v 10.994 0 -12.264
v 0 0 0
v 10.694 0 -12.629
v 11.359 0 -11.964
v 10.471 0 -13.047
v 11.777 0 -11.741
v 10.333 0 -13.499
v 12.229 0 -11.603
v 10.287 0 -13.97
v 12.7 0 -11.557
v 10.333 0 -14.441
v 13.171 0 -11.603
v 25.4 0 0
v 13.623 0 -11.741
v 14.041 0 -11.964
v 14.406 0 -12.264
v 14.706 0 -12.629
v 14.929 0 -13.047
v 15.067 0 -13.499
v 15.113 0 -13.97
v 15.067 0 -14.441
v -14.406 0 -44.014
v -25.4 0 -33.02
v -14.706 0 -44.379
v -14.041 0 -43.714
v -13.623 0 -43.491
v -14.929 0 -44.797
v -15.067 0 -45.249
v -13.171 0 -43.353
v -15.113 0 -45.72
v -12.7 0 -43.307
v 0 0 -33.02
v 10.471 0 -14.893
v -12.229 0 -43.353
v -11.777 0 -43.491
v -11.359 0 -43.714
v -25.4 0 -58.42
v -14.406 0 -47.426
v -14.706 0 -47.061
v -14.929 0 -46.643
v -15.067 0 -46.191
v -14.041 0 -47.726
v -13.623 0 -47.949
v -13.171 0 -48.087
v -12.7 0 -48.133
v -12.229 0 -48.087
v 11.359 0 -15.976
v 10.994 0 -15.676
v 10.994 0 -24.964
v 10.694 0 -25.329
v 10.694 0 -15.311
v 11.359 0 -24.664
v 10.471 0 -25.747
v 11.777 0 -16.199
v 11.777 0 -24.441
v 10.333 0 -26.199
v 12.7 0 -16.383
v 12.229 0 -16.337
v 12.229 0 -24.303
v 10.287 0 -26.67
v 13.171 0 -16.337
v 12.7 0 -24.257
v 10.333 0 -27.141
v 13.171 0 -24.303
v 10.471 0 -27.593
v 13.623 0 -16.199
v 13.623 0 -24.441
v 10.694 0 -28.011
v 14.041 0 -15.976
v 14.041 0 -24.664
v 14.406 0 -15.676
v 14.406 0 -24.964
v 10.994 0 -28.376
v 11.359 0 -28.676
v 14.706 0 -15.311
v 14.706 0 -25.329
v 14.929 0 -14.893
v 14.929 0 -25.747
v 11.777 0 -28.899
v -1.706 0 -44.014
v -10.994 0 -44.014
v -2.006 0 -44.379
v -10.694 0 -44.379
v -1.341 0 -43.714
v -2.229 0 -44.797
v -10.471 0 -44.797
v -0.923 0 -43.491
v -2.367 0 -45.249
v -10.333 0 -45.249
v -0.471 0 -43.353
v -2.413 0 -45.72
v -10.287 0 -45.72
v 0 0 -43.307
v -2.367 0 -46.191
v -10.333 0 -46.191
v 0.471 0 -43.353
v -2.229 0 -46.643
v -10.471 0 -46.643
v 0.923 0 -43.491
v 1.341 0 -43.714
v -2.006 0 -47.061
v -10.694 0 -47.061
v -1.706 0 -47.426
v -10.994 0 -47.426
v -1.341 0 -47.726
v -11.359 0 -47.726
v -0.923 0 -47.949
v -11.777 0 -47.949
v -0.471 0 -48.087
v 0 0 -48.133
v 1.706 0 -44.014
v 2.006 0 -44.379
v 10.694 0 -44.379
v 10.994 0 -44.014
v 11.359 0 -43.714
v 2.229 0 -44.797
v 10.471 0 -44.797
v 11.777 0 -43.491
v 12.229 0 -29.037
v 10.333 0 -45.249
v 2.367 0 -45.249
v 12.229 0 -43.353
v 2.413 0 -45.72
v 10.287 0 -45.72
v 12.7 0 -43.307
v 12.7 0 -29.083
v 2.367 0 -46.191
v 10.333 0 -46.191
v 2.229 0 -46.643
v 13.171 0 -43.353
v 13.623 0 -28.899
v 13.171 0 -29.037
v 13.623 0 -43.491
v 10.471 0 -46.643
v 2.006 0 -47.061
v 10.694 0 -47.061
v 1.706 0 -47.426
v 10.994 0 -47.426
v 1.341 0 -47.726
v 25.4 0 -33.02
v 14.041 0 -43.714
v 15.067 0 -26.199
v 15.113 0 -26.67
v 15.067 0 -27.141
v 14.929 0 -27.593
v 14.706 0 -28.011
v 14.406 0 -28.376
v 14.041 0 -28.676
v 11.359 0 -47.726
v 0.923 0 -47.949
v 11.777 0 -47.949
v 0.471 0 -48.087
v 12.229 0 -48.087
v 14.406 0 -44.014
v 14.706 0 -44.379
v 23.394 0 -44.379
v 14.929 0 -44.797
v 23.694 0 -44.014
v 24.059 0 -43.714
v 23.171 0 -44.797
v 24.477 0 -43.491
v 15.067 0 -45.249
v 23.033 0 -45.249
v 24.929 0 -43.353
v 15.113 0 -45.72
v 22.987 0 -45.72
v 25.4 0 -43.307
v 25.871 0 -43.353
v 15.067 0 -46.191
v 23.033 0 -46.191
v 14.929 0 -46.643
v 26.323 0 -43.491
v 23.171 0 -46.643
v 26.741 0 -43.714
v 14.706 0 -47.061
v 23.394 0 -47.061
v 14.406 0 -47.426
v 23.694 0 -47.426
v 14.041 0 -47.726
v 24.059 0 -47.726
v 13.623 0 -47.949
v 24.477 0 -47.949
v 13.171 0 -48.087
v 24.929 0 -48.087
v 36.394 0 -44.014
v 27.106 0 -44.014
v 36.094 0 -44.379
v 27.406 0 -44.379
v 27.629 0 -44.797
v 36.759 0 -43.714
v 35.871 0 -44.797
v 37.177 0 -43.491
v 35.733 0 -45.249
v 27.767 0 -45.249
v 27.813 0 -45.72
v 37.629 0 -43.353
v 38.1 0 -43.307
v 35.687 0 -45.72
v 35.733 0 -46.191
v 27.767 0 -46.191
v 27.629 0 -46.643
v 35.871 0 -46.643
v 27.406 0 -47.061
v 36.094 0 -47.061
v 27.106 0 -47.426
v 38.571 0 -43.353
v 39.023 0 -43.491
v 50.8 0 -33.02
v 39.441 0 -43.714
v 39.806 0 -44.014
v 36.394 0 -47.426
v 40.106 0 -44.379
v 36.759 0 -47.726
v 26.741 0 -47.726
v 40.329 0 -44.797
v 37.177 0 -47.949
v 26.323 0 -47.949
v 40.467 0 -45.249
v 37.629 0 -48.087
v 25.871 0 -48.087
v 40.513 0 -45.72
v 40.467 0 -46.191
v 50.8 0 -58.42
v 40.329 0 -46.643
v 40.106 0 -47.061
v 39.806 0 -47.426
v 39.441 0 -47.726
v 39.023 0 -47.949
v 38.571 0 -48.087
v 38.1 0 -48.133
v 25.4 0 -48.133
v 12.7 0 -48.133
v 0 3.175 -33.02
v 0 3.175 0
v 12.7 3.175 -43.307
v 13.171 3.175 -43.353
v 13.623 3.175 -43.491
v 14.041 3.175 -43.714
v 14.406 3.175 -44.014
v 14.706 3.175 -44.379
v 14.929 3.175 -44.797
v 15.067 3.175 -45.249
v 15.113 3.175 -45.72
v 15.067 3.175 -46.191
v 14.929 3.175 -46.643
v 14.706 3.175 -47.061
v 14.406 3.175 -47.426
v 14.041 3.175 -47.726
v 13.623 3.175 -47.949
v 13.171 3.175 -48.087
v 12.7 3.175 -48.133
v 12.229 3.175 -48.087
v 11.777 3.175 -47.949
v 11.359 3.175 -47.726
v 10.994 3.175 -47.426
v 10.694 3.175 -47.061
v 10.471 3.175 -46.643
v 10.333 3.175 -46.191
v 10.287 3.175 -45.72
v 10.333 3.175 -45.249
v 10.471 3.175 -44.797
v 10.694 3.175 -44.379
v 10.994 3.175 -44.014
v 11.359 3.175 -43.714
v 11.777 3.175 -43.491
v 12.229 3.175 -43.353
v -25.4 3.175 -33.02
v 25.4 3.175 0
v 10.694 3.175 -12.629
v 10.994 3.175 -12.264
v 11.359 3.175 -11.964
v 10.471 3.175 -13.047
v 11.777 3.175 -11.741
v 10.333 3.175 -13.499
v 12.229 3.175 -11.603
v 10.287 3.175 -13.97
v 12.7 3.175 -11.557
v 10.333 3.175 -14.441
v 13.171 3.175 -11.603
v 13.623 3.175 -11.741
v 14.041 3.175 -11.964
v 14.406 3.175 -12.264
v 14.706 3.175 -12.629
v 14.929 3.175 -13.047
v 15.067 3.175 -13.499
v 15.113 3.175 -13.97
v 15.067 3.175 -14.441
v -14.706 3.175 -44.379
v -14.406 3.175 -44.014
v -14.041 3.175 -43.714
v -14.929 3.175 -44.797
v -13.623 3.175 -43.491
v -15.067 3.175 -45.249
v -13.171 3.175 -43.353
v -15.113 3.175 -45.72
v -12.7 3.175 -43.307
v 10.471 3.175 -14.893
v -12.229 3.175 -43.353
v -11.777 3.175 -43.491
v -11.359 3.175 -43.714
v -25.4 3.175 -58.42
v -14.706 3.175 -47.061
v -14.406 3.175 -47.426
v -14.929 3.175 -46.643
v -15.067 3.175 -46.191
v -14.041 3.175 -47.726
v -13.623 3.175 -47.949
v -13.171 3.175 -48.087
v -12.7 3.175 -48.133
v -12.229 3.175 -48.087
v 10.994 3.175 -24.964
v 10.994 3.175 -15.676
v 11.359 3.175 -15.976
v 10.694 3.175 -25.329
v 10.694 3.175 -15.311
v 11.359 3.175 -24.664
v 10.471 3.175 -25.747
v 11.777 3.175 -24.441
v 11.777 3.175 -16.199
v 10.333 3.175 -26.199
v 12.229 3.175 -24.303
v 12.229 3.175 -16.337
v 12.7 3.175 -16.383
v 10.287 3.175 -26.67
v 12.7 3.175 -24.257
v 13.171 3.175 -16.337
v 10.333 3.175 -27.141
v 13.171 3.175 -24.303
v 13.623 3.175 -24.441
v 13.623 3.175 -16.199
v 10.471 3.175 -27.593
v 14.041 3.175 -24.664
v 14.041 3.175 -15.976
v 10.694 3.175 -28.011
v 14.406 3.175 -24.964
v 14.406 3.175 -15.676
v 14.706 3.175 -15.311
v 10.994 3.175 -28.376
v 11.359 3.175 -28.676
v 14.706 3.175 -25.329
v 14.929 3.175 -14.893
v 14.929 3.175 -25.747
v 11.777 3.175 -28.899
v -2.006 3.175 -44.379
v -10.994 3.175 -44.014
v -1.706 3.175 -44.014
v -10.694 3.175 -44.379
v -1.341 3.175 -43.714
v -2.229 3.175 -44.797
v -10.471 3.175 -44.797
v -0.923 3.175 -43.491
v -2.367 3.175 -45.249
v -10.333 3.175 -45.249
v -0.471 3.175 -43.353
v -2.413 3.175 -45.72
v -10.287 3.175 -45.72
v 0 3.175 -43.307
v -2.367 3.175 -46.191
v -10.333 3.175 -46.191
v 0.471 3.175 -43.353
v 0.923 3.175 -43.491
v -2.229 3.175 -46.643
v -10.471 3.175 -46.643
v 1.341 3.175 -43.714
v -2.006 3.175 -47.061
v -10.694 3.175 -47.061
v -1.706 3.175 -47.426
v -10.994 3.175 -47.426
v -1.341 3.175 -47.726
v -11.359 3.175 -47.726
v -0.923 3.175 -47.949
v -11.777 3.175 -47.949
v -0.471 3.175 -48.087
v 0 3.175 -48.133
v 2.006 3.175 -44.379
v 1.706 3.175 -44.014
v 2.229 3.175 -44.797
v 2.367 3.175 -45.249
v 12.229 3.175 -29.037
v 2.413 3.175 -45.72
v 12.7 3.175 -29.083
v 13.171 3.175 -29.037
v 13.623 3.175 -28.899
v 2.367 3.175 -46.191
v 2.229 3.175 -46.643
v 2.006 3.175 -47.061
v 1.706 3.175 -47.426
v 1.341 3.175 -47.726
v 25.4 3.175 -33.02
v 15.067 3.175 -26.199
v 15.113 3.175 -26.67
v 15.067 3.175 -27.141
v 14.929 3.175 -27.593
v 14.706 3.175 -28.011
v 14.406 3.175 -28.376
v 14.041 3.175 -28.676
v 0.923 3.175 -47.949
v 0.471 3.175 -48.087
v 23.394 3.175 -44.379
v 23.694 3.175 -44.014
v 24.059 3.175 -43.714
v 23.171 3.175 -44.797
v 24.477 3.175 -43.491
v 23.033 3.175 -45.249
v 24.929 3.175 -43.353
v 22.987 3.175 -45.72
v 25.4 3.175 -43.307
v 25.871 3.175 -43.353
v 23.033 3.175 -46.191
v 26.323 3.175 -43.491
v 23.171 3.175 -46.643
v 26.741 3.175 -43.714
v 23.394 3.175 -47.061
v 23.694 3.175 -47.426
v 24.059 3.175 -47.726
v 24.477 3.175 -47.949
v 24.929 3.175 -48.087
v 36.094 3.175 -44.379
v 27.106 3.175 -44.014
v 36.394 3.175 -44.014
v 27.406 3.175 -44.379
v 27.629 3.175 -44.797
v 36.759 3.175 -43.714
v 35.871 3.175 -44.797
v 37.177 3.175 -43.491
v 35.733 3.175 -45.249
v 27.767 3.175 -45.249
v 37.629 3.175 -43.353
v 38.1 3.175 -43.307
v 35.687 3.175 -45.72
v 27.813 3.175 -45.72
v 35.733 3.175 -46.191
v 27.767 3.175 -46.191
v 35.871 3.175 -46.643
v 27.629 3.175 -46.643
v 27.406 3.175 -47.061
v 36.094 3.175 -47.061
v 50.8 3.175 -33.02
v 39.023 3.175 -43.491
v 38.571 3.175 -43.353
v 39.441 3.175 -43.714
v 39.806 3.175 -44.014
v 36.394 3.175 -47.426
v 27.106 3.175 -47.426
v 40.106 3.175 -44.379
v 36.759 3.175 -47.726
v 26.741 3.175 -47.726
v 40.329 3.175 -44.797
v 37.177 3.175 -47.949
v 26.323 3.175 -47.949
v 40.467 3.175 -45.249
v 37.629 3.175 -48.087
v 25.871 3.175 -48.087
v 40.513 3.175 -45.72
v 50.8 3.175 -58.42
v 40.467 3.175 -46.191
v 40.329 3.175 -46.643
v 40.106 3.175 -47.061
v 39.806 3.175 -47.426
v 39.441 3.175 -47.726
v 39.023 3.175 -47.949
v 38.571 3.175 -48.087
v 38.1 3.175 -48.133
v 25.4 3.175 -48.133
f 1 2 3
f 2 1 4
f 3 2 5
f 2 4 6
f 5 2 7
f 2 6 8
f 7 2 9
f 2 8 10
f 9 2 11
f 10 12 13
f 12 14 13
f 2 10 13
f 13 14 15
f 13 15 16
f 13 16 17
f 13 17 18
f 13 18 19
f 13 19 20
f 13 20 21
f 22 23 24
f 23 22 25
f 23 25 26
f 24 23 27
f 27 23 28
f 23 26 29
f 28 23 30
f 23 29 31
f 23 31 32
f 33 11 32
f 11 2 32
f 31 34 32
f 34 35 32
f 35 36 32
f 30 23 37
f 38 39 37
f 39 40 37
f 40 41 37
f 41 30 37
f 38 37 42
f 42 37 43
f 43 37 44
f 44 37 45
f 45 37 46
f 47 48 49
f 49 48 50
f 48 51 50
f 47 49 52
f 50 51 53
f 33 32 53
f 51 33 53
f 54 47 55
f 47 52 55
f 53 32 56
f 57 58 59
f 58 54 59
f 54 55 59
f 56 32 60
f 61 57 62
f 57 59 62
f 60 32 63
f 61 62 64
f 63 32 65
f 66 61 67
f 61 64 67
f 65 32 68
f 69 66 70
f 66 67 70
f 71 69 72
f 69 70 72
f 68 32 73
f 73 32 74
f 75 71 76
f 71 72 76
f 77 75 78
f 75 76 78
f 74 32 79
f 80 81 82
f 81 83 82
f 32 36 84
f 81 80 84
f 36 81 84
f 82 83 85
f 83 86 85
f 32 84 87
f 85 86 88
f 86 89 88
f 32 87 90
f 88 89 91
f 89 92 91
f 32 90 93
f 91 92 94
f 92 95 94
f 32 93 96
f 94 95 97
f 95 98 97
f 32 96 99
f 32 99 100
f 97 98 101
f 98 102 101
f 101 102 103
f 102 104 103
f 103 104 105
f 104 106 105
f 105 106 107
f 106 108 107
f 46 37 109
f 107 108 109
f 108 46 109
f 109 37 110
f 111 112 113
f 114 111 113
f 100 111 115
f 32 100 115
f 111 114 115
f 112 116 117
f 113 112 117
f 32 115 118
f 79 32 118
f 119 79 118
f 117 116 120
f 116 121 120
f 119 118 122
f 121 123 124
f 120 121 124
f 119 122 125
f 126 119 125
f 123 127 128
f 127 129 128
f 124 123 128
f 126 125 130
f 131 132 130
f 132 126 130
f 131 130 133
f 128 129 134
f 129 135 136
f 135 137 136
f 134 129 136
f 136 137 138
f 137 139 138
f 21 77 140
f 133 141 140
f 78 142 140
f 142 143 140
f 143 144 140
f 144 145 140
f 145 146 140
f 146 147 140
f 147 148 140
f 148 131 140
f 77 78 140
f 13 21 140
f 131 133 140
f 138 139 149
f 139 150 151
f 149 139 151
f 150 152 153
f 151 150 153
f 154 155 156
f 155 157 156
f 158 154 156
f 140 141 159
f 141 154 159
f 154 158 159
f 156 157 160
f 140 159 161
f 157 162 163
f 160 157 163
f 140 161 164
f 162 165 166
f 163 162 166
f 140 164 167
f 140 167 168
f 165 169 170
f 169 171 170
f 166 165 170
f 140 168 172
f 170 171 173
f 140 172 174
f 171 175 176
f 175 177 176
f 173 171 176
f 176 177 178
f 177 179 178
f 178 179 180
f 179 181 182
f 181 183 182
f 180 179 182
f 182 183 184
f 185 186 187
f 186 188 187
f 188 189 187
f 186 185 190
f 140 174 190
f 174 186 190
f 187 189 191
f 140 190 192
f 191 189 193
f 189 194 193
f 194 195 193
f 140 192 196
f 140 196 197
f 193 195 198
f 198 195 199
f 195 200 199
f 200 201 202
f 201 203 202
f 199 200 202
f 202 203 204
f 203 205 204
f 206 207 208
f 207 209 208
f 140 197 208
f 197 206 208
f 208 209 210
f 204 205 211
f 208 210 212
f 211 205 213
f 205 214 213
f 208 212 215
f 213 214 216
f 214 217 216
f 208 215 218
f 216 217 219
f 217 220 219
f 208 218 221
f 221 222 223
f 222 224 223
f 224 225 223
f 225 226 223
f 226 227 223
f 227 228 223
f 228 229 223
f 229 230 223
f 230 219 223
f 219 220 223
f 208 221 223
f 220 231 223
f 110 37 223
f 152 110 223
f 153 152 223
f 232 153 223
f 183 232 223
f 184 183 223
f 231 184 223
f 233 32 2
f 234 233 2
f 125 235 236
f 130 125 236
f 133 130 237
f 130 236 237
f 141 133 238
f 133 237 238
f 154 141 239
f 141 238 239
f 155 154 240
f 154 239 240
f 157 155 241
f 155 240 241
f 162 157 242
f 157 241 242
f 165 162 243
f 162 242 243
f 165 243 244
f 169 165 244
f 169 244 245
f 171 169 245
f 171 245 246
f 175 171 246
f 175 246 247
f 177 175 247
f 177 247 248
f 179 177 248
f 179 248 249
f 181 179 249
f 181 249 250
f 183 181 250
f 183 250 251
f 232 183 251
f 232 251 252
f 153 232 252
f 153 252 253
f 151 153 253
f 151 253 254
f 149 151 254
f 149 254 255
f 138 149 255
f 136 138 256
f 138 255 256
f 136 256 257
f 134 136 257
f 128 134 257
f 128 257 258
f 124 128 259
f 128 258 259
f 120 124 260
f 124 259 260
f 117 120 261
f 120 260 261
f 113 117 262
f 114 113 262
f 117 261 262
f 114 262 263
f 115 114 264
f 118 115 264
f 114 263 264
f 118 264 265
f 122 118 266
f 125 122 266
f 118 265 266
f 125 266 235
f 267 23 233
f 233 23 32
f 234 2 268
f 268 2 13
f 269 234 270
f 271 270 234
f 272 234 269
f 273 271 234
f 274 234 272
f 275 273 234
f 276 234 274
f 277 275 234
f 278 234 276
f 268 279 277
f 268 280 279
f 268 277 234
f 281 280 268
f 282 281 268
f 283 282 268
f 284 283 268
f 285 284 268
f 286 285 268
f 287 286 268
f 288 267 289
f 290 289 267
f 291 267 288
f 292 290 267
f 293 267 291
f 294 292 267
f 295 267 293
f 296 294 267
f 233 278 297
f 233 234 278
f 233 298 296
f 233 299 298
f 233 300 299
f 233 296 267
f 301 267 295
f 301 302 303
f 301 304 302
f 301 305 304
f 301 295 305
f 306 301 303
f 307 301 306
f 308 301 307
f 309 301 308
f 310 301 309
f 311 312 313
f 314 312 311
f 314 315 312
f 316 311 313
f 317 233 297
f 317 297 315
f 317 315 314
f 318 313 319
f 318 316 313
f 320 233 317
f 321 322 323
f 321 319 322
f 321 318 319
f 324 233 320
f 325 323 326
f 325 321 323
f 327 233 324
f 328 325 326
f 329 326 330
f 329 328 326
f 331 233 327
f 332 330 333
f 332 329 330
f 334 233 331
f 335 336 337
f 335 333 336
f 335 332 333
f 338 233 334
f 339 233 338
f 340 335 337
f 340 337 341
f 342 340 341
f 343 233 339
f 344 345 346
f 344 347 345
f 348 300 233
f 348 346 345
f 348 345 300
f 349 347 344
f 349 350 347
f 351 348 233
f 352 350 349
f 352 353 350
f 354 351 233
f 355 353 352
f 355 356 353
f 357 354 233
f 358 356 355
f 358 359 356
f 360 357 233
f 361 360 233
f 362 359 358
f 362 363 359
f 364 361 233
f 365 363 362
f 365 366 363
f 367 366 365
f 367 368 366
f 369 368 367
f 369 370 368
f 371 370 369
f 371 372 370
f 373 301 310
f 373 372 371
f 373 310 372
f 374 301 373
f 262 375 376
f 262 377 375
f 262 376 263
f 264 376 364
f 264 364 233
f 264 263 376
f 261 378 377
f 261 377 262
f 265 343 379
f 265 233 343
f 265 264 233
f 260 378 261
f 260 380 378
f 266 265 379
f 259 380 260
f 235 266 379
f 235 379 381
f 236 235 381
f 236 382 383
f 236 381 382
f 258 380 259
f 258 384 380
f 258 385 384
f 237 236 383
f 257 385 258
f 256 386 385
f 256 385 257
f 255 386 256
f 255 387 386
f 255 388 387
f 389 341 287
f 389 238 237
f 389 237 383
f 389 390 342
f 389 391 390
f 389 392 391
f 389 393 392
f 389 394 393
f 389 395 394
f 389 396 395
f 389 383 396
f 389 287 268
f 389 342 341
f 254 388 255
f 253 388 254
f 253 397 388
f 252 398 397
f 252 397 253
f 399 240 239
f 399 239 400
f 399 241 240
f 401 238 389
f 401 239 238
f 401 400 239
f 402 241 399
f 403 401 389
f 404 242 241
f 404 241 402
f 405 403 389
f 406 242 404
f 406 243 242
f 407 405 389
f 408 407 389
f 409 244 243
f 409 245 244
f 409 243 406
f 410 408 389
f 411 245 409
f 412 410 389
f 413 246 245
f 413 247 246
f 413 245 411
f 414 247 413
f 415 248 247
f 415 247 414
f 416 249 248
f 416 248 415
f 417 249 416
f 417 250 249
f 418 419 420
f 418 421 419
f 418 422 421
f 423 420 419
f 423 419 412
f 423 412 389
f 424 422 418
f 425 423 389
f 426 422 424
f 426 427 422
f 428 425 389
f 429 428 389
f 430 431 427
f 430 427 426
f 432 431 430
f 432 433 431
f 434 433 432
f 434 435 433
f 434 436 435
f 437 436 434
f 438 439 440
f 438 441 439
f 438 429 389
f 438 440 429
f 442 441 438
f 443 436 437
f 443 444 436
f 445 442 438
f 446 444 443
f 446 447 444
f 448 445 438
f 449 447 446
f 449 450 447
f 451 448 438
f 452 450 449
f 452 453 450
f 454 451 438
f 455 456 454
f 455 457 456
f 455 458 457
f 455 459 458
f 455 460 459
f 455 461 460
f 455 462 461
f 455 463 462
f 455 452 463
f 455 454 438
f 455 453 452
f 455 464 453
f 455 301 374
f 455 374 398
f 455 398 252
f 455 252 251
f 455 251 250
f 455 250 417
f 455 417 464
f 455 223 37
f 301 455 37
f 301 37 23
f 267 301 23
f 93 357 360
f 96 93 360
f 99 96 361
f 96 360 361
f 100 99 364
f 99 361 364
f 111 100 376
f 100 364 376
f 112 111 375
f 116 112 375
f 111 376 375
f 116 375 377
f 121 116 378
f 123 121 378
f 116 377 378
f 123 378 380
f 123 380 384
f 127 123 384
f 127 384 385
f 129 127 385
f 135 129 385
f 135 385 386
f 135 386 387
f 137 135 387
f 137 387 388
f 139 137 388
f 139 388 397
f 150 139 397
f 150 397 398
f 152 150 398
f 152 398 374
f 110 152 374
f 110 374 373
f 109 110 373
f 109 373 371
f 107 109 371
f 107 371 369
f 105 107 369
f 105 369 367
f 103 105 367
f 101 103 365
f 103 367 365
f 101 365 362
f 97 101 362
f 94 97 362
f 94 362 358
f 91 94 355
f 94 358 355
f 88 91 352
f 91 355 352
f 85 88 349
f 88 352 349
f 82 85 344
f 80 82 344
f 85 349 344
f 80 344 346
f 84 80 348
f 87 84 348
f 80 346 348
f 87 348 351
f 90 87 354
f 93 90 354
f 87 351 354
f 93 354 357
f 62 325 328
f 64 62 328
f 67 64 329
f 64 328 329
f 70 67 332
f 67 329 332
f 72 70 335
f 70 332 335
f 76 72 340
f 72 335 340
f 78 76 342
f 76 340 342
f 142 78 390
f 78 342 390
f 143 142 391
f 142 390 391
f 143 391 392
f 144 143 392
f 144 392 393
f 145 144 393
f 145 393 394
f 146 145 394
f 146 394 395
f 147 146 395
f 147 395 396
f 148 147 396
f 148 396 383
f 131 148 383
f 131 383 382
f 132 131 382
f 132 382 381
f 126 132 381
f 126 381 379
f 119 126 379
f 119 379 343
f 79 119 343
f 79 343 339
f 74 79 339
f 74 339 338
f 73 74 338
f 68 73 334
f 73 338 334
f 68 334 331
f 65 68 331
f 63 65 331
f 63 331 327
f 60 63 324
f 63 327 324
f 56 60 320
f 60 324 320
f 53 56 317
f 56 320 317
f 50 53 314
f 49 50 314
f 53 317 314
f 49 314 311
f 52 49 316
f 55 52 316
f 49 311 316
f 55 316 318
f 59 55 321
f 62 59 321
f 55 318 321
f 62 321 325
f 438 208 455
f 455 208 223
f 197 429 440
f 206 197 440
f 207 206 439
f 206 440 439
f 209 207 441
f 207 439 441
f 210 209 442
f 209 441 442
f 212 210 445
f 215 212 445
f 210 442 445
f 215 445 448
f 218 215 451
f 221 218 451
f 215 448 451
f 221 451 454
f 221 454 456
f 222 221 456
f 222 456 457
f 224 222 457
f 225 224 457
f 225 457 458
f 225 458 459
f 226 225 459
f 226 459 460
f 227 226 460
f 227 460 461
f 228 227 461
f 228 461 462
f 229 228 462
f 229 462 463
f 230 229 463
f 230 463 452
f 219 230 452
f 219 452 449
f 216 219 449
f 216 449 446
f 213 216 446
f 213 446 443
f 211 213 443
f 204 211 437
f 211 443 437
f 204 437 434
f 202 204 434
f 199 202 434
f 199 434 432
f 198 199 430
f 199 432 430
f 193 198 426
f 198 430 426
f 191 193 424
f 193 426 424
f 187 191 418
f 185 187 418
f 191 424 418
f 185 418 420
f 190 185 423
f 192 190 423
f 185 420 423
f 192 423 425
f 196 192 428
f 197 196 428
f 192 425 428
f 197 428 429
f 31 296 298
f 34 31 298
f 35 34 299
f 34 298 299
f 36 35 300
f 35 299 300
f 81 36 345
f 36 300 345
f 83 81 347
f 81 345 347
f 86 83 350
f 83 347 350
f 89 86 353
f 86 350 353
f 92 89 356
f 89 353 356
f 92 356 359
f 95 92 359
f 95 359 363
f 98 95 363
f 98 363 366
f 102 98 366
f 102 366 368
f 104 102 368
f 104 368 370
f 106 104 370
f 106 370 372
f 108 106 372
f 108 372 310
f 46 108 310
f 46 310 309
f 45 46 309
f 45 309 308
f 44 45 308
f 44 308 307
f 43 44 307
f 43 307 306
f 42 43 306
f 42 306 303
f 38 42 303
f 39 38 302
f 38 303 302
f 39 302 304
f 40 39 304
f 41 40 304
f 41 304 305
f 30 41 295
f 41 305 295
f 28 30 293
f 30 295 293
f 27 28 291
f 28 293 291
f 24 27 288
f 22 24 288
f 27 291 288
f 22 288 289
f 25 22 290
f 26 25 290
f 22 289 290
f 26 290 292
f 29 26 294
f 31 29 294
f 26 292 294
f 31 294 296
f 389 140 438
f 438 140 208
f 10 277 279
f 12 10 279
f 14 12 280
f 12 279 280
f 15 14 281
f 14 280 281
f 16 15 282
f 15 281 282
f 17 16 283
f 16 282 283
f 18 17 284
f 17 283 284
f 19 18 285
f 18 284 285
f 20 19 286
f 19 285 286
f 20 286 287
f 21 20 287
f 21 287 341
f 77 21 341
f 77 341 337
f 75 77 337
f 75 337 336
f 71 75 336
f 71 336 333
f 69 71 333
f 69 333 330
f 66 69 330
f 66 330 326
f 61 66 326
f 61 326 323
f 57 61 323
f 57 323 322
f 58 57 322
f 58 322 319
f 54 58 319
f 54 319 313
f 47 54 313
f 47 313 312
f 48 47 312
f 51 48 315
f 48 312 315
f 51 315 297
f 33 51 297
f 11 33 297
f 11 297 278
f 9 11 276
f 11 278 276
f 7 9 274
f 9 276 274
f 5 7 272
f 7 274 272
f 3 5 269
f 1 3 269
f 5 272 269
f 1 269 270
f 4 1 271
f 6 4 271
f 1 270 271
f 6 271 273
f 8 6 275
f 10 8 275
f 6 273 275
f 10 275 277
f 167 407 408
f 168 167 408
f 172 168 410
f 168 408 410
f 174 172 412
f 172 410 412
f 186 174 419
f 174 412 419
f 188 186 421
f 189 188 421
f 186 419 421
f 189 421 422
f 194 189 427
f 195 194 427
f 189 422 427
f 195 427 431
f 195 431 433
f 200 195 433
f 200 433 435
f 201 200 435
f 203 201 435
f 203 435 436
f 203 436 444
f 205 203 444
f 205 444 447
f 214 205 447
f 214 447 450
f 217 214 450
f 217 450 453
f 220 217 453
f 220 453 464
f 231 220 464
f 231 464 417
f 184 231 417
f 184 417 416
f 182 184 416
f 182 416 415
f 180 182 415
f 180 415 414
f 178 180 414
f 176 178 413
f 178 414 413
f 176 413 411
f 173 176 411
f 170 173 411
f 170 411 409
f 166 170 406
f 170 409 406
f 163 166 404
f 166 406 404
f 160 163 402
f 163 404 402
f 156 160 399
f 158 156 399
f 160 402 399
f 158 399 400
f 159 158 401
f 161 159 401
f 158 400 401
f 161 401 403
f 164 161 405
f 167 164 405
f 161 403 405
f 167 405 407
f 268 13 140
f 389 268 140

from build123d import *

# Parameters (mm, degrees)
BOSS_EXTRUDE1_DEPTH = 3.175
SKETCH3_R           = 2.413
CUT_EXTRUDE1_DEPTH  = 78.483011202


with BuildPart() as part:
    # Sketch2 → Boss-Extrude1 (new body)
    with BuildSketch(Plane(origin=(0, 0, 0), x_dir=(1, 0, 0), z_dir=(0, 1, 0))):
        Polygon((25.4, 33.02), (50.8, 33.02), (50.8, 58.42), (-25.4, 58.42), (-25.4, 33.02), (0, 33.02), (0, 0), (25.4, 0), align=None)
    extrude(amount=BOSS_EXTRUDE1_DEPTH)

    # Sketch3 → Cut-Extrude1 (cut, through all)
    with BuildSketch(Plane(origin=(0, 3.175, 0), x_dir=(1, 0, 0), z_dir=(0, 1, 0))):
        with Locations(Location((12.7, 13.97, 0), (0, 0, 270))):
            Circle(SKETCH3_R)
        with Locations(Location((-12.7, 45.72, 0), (0, 0, 270))):
            Circle(SKETCH3_R)
        with Locations(Location((12.7, 26.67, 0), (0, 0, 270))):
            Circle(SKETCH3_R)
        with Locations(Location((0, 45.72, 0), (0, 0, 270))):
            Circle(SKETCH3_R)
        with Locations(Location((12.7, 45.72, 0), (0, 0, 270))):
            Circle(SKETCH3_R)
        with Locations(Location((25.4, 45.72, 0), (0, 0, 270))):
            Circle(SKETCH3_R)
        with Locations(Location((38.1, 45.72, 0), (0, 0, 270))):
            Circle(SKETCH3_R)
    extrude(amount=-CUT_EXTRUDE1_DEPTH, mode=Mode.SUBTRACT)


solid = part.part
